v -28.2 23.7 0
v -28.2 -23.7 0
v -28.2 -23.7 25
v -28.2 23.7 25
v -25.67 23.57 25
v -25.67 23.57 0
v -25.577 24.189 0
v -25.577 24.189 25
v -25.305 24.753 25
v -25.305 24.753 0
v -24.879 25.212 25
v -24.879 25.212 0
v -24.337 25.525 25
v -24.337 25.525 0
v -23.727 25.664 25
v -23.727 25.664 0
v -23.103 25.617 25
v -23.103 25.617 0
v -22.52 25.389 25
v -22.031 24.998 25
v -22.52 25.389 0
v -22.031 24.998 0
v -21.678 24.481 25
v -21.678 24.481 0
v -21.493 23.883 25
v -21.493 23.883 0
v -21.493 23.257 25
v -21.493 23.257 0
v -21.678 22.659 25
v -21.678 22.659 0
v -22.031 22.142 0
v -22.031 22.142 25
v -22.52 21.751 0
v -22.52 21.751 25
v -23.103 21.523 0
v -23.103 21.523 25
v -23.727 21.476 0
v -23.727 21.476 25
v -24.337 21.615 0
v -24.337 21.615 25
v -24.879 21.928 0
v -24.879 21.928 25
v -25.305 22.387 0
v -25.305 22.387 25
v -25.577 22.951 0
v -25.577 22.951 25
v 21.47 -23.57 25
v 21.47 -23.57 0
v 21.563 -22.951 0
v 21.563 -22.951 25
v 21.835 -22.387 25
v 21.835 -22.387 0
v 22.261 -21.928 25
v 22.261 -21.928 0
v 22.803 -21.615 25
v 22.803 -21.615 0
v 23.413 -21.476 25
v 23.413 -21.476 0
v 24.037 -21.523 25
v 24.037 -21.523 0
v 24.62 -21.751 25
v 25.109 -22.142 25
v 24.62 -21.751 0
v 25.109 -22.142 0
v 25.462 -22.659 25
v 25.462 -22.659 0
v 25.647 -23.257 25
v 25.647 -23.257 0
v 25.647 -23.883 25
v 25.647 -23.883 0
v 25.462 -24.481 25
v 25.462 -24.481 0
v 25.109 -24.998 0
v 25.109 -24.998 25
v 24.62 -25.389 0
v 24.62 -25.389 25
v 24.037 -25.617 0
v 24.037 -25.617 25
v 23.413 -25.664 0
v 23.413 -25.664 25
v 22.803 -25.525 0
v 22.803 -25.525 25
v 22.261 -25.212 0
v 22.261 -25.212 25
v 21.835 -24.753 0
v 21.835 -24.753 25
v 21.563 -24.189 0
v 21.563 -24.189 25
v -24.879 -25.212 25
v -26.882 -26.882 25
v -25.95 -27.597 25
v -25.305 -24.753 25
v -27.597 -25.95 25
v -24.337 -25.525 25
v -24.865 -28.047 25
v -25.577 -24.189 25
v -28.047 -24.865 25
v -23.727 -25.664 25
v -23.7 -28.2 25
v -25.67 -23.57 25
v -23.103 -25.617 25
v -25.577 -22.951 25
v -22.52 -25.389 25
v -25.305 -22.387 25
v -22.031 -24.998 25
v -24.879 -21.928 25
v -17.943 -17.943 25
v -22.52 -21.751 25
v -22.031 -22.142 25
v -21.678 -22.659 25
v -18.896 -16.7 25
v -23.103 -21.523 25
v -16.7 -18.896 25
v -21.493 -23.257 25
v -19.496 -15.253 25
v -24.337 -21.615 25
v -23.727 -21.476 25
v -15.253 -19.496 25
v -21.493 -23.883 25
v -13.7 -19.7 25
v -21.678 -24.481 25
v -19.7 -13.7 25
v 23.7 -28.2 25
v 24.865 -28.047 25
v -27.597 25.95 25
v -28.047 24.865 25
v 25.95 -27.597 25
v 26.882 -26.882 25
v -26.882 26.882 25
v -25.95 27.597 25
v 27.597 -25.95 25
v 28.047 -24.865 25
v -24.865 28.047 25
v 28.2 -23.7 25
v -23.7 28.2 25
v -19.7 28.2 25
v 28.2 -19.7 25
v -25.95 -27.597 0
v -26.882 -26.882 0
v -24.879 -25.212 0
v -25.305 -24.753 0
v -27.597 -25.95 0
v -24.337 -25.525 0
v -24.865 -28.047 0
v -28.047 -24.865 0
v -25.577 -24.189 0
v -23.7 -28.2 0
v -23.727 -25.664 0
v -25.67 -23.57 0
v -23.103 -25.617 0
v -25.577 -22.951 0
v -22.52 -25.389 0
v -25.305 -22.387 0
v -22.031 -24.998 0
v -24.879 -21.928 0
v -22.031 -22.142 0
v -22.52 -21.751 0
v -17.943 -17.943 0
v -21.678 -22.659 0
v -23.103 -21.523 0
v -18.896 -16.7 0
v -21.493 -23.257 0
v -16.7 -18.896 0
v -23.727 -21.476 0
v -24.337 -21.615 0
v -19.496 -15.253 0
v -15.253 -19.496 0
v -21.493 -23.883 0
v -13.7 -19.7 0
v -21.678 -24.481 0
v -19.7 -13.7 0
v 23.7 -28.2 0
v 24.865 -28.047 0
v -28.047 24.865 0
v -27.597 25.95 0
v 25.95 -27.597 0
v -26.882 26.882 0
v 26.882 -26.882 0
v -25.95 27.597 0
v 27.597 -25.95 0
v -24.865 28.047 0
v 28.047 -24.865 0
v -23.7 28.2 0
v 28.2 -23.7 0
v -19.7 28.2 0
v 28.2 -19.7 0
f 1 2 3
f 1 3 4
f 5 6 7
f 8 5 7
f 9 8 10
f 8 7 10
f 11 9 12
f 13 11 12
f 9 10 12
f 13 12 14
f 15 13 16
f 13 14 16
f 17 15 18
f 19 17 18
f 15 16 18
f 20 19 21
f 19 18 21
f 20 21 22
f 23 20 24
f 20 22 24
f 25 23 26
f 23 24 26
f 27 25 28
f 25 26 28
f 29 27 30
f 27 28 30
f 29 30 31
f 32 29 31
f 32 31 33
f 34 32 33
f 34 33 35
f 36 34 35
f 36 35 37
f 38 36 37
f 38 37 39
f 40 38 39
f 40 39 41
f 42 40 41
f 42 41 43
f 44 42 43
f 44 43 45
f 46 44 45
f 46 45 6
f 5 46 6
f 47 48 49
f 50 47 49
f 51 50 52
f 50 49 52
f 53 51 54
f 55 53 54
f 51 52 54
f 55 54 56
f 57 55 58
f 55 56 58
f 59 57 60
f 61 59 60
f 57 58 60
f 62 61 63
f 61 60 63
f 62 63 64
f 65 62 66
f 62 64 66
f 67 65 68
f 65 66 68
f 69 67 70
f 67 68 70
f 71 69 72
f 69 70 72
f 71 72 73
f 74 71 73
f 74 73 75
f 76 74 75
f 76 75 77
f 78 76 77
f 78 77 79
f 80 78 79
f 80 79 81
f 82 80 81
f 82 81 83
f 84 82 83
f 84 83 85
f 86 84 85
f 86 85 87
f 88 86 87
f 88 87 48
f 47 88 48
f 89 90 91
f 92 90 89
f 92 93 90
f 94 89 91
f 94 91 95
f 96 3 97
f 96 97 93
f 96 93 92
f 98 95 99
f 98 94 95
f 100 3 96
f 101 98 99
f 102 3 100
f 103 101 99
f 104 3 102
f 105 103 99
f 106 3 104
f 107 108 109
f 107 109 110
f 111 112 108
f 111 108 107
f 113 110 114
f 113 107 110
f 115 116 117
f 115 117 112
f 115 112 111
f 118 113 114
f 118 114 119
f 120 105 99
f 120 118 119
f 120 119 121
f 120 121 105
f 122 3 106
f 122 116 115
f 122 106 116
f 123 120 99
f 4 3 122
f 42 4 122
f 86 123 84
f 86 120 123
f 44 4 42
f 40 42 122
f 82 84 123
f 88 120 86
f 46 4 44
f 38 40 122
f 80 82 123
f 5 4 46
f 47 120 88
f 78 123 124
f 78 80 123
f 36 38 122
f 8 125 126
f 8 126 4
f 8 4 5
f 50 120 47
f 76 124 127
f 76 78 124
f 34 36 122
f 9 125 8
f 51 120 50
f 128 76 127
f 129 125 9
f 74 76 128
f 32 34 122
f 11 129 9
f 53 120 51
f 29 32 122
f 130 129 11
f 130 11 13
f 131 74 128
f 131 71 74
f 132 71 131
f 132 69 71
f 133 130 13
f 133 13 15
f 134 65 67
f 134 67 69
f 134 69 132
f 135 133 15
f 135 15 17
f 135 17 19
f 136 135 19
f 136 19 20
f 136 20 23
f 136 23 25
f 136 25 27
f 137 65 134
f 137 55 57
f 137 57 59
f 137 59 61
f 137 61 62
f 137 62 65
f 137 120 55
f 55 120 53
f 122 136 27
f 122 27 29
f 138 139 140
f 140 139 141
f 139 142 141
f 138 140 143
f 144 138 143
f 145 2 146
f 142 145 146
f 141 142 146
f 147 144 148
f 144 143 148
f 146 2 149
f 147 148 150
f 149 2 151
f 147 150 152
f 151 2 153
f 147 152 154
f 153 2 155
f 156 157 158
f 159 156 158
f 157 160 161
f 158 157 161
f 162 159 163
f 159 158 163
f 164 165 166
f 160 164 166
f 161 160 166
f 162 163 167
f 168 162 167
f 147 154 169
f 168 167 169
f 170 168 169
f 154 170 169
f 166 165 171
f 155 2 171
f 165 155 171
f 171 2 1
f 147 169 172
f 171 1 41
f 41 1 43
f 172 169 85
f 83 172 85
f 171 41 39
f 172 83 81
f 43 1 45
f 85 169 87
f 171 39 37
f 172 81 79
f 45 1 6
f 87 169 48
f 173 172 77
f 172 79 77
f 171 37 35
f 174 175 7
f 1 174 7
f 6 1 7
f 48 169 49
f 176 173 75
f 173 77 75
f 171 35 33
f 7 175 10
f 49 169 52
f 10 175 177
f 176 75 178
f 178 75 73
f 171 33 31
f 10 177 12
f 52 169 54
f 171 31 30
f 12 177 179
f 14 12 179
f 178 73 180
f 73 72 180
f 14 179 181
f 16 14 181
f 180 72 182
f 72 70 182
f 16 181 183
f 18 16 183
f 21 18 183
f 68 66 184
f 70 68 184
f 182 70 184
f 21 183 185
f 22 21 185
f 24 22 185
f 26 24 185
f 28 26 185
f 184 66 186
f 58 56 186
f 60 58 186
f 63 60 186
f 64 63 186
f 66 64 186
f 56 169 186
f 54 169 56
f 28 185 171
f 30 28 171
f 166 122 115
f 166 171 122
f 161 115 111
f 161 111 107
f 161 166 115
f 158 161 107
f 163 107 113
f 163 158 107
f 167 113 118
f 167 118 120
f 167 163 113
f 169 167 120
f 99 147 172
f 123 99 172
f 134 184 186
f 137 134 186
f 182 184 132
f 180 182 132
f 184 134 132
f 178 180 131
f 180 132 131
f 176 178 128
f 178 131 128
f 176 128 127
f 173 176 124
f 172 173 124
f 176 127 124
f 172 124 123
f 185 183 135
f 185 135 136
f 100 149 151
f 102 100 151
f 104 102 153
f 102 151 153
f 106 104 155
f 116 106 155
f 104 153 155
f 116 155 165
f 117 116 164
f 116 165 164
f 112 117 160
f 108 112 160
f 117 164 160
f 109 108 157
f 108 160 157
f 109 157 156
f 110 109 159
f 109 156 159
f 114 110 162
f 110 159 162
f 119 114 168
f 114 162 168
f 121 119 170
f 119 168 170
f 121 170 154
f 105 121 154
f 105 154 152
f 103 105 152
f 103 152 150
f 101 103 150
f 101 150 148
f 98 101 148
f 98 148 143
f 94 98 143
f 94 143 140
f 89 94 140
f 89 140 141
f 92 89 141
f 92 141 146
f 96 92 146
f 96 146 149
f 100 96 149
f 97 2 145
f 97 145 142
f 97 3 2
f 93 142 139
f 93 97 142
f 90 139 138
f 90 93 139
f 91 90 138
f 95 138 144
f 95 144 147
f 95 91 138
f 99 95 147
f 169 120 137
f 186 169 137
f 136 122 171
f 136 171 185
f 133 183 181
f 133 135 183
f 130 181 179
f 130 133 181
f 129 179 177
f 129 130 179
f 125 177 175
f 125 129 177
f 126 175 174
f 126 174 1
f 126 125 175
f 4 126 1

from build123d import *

# Parameters (mm, degrees)
ESQUISSE1_W                               = 56.4
ESQUISSE1_H                               = 56.4
BOSS_EXTRU_1_DEPTH                        = 25
ESQUISSE2_W                               = 75.873546066
ESQUISSE2_H                               = 70.951609501
ENL_V_MAT_EXTRU_1_DEPTH                   = 26
TROU_POUR_TARAUDAGE_POUR_TROU_TARAUD_M5_D = 4.2
CONG_1_R                                  = 6
CONG_2_R                                  = 4.5


with BuildPart() as part:
    # Esquisse1 → Boss.-Extru.1 (new body)
    with BuildSketch(Plane.XY):
        Rectangle(ESQUISSE1_W, ESQUISSE1_H)
    extrude(amount=BOSS_EXTRU_1_DEPTH)

    # Esquisse2 → Enlèv. mat.-Extru.1 (cut, through all)
    with BuildSketch(Plane.XY.offset(25)):
        with Locations((18.236773033, 15.775804751)):
            Rectangle(ESQUISSE2_W, ESQUISSE2_H)
    extrude(amount=-ENL_V_MAT_EXTRU_1_DEPTH, mode=Mode.SUBTRACT)

    # Trou pour taraudage pour trou taraudé M51 (through all)
    with Locations(Plane.XY.offset(25)):
        with Locations((23.57, 23.57), (-23.57, -23.57), (-23.57, 23.57), (23.57, -23.57)):
            Hole(TROU_POUR_TARAUDAGE_POUR_TROU_TARAUD_M5_D / 2)

    # Congé1
    cong_1_edges = [part.edges().sort_by_distance(p)[0] for p in [
        (-19.7, -19.7, 12.5),
    ]]
    fillet(cong_1_edges, radius=CONG_1_R)

    # Congé2
    cong_2_edges = [part.edges().sort_by_distance(p)[0] for p in [
        (28.2, -28.2, 12.5),
        (-28.2, -28.2, 12.5),
        (-28.2, 28.2, 12.5),
    ]]
    fillet(cong_2_edges, radius=CONG_2_R)


solid = part.part
